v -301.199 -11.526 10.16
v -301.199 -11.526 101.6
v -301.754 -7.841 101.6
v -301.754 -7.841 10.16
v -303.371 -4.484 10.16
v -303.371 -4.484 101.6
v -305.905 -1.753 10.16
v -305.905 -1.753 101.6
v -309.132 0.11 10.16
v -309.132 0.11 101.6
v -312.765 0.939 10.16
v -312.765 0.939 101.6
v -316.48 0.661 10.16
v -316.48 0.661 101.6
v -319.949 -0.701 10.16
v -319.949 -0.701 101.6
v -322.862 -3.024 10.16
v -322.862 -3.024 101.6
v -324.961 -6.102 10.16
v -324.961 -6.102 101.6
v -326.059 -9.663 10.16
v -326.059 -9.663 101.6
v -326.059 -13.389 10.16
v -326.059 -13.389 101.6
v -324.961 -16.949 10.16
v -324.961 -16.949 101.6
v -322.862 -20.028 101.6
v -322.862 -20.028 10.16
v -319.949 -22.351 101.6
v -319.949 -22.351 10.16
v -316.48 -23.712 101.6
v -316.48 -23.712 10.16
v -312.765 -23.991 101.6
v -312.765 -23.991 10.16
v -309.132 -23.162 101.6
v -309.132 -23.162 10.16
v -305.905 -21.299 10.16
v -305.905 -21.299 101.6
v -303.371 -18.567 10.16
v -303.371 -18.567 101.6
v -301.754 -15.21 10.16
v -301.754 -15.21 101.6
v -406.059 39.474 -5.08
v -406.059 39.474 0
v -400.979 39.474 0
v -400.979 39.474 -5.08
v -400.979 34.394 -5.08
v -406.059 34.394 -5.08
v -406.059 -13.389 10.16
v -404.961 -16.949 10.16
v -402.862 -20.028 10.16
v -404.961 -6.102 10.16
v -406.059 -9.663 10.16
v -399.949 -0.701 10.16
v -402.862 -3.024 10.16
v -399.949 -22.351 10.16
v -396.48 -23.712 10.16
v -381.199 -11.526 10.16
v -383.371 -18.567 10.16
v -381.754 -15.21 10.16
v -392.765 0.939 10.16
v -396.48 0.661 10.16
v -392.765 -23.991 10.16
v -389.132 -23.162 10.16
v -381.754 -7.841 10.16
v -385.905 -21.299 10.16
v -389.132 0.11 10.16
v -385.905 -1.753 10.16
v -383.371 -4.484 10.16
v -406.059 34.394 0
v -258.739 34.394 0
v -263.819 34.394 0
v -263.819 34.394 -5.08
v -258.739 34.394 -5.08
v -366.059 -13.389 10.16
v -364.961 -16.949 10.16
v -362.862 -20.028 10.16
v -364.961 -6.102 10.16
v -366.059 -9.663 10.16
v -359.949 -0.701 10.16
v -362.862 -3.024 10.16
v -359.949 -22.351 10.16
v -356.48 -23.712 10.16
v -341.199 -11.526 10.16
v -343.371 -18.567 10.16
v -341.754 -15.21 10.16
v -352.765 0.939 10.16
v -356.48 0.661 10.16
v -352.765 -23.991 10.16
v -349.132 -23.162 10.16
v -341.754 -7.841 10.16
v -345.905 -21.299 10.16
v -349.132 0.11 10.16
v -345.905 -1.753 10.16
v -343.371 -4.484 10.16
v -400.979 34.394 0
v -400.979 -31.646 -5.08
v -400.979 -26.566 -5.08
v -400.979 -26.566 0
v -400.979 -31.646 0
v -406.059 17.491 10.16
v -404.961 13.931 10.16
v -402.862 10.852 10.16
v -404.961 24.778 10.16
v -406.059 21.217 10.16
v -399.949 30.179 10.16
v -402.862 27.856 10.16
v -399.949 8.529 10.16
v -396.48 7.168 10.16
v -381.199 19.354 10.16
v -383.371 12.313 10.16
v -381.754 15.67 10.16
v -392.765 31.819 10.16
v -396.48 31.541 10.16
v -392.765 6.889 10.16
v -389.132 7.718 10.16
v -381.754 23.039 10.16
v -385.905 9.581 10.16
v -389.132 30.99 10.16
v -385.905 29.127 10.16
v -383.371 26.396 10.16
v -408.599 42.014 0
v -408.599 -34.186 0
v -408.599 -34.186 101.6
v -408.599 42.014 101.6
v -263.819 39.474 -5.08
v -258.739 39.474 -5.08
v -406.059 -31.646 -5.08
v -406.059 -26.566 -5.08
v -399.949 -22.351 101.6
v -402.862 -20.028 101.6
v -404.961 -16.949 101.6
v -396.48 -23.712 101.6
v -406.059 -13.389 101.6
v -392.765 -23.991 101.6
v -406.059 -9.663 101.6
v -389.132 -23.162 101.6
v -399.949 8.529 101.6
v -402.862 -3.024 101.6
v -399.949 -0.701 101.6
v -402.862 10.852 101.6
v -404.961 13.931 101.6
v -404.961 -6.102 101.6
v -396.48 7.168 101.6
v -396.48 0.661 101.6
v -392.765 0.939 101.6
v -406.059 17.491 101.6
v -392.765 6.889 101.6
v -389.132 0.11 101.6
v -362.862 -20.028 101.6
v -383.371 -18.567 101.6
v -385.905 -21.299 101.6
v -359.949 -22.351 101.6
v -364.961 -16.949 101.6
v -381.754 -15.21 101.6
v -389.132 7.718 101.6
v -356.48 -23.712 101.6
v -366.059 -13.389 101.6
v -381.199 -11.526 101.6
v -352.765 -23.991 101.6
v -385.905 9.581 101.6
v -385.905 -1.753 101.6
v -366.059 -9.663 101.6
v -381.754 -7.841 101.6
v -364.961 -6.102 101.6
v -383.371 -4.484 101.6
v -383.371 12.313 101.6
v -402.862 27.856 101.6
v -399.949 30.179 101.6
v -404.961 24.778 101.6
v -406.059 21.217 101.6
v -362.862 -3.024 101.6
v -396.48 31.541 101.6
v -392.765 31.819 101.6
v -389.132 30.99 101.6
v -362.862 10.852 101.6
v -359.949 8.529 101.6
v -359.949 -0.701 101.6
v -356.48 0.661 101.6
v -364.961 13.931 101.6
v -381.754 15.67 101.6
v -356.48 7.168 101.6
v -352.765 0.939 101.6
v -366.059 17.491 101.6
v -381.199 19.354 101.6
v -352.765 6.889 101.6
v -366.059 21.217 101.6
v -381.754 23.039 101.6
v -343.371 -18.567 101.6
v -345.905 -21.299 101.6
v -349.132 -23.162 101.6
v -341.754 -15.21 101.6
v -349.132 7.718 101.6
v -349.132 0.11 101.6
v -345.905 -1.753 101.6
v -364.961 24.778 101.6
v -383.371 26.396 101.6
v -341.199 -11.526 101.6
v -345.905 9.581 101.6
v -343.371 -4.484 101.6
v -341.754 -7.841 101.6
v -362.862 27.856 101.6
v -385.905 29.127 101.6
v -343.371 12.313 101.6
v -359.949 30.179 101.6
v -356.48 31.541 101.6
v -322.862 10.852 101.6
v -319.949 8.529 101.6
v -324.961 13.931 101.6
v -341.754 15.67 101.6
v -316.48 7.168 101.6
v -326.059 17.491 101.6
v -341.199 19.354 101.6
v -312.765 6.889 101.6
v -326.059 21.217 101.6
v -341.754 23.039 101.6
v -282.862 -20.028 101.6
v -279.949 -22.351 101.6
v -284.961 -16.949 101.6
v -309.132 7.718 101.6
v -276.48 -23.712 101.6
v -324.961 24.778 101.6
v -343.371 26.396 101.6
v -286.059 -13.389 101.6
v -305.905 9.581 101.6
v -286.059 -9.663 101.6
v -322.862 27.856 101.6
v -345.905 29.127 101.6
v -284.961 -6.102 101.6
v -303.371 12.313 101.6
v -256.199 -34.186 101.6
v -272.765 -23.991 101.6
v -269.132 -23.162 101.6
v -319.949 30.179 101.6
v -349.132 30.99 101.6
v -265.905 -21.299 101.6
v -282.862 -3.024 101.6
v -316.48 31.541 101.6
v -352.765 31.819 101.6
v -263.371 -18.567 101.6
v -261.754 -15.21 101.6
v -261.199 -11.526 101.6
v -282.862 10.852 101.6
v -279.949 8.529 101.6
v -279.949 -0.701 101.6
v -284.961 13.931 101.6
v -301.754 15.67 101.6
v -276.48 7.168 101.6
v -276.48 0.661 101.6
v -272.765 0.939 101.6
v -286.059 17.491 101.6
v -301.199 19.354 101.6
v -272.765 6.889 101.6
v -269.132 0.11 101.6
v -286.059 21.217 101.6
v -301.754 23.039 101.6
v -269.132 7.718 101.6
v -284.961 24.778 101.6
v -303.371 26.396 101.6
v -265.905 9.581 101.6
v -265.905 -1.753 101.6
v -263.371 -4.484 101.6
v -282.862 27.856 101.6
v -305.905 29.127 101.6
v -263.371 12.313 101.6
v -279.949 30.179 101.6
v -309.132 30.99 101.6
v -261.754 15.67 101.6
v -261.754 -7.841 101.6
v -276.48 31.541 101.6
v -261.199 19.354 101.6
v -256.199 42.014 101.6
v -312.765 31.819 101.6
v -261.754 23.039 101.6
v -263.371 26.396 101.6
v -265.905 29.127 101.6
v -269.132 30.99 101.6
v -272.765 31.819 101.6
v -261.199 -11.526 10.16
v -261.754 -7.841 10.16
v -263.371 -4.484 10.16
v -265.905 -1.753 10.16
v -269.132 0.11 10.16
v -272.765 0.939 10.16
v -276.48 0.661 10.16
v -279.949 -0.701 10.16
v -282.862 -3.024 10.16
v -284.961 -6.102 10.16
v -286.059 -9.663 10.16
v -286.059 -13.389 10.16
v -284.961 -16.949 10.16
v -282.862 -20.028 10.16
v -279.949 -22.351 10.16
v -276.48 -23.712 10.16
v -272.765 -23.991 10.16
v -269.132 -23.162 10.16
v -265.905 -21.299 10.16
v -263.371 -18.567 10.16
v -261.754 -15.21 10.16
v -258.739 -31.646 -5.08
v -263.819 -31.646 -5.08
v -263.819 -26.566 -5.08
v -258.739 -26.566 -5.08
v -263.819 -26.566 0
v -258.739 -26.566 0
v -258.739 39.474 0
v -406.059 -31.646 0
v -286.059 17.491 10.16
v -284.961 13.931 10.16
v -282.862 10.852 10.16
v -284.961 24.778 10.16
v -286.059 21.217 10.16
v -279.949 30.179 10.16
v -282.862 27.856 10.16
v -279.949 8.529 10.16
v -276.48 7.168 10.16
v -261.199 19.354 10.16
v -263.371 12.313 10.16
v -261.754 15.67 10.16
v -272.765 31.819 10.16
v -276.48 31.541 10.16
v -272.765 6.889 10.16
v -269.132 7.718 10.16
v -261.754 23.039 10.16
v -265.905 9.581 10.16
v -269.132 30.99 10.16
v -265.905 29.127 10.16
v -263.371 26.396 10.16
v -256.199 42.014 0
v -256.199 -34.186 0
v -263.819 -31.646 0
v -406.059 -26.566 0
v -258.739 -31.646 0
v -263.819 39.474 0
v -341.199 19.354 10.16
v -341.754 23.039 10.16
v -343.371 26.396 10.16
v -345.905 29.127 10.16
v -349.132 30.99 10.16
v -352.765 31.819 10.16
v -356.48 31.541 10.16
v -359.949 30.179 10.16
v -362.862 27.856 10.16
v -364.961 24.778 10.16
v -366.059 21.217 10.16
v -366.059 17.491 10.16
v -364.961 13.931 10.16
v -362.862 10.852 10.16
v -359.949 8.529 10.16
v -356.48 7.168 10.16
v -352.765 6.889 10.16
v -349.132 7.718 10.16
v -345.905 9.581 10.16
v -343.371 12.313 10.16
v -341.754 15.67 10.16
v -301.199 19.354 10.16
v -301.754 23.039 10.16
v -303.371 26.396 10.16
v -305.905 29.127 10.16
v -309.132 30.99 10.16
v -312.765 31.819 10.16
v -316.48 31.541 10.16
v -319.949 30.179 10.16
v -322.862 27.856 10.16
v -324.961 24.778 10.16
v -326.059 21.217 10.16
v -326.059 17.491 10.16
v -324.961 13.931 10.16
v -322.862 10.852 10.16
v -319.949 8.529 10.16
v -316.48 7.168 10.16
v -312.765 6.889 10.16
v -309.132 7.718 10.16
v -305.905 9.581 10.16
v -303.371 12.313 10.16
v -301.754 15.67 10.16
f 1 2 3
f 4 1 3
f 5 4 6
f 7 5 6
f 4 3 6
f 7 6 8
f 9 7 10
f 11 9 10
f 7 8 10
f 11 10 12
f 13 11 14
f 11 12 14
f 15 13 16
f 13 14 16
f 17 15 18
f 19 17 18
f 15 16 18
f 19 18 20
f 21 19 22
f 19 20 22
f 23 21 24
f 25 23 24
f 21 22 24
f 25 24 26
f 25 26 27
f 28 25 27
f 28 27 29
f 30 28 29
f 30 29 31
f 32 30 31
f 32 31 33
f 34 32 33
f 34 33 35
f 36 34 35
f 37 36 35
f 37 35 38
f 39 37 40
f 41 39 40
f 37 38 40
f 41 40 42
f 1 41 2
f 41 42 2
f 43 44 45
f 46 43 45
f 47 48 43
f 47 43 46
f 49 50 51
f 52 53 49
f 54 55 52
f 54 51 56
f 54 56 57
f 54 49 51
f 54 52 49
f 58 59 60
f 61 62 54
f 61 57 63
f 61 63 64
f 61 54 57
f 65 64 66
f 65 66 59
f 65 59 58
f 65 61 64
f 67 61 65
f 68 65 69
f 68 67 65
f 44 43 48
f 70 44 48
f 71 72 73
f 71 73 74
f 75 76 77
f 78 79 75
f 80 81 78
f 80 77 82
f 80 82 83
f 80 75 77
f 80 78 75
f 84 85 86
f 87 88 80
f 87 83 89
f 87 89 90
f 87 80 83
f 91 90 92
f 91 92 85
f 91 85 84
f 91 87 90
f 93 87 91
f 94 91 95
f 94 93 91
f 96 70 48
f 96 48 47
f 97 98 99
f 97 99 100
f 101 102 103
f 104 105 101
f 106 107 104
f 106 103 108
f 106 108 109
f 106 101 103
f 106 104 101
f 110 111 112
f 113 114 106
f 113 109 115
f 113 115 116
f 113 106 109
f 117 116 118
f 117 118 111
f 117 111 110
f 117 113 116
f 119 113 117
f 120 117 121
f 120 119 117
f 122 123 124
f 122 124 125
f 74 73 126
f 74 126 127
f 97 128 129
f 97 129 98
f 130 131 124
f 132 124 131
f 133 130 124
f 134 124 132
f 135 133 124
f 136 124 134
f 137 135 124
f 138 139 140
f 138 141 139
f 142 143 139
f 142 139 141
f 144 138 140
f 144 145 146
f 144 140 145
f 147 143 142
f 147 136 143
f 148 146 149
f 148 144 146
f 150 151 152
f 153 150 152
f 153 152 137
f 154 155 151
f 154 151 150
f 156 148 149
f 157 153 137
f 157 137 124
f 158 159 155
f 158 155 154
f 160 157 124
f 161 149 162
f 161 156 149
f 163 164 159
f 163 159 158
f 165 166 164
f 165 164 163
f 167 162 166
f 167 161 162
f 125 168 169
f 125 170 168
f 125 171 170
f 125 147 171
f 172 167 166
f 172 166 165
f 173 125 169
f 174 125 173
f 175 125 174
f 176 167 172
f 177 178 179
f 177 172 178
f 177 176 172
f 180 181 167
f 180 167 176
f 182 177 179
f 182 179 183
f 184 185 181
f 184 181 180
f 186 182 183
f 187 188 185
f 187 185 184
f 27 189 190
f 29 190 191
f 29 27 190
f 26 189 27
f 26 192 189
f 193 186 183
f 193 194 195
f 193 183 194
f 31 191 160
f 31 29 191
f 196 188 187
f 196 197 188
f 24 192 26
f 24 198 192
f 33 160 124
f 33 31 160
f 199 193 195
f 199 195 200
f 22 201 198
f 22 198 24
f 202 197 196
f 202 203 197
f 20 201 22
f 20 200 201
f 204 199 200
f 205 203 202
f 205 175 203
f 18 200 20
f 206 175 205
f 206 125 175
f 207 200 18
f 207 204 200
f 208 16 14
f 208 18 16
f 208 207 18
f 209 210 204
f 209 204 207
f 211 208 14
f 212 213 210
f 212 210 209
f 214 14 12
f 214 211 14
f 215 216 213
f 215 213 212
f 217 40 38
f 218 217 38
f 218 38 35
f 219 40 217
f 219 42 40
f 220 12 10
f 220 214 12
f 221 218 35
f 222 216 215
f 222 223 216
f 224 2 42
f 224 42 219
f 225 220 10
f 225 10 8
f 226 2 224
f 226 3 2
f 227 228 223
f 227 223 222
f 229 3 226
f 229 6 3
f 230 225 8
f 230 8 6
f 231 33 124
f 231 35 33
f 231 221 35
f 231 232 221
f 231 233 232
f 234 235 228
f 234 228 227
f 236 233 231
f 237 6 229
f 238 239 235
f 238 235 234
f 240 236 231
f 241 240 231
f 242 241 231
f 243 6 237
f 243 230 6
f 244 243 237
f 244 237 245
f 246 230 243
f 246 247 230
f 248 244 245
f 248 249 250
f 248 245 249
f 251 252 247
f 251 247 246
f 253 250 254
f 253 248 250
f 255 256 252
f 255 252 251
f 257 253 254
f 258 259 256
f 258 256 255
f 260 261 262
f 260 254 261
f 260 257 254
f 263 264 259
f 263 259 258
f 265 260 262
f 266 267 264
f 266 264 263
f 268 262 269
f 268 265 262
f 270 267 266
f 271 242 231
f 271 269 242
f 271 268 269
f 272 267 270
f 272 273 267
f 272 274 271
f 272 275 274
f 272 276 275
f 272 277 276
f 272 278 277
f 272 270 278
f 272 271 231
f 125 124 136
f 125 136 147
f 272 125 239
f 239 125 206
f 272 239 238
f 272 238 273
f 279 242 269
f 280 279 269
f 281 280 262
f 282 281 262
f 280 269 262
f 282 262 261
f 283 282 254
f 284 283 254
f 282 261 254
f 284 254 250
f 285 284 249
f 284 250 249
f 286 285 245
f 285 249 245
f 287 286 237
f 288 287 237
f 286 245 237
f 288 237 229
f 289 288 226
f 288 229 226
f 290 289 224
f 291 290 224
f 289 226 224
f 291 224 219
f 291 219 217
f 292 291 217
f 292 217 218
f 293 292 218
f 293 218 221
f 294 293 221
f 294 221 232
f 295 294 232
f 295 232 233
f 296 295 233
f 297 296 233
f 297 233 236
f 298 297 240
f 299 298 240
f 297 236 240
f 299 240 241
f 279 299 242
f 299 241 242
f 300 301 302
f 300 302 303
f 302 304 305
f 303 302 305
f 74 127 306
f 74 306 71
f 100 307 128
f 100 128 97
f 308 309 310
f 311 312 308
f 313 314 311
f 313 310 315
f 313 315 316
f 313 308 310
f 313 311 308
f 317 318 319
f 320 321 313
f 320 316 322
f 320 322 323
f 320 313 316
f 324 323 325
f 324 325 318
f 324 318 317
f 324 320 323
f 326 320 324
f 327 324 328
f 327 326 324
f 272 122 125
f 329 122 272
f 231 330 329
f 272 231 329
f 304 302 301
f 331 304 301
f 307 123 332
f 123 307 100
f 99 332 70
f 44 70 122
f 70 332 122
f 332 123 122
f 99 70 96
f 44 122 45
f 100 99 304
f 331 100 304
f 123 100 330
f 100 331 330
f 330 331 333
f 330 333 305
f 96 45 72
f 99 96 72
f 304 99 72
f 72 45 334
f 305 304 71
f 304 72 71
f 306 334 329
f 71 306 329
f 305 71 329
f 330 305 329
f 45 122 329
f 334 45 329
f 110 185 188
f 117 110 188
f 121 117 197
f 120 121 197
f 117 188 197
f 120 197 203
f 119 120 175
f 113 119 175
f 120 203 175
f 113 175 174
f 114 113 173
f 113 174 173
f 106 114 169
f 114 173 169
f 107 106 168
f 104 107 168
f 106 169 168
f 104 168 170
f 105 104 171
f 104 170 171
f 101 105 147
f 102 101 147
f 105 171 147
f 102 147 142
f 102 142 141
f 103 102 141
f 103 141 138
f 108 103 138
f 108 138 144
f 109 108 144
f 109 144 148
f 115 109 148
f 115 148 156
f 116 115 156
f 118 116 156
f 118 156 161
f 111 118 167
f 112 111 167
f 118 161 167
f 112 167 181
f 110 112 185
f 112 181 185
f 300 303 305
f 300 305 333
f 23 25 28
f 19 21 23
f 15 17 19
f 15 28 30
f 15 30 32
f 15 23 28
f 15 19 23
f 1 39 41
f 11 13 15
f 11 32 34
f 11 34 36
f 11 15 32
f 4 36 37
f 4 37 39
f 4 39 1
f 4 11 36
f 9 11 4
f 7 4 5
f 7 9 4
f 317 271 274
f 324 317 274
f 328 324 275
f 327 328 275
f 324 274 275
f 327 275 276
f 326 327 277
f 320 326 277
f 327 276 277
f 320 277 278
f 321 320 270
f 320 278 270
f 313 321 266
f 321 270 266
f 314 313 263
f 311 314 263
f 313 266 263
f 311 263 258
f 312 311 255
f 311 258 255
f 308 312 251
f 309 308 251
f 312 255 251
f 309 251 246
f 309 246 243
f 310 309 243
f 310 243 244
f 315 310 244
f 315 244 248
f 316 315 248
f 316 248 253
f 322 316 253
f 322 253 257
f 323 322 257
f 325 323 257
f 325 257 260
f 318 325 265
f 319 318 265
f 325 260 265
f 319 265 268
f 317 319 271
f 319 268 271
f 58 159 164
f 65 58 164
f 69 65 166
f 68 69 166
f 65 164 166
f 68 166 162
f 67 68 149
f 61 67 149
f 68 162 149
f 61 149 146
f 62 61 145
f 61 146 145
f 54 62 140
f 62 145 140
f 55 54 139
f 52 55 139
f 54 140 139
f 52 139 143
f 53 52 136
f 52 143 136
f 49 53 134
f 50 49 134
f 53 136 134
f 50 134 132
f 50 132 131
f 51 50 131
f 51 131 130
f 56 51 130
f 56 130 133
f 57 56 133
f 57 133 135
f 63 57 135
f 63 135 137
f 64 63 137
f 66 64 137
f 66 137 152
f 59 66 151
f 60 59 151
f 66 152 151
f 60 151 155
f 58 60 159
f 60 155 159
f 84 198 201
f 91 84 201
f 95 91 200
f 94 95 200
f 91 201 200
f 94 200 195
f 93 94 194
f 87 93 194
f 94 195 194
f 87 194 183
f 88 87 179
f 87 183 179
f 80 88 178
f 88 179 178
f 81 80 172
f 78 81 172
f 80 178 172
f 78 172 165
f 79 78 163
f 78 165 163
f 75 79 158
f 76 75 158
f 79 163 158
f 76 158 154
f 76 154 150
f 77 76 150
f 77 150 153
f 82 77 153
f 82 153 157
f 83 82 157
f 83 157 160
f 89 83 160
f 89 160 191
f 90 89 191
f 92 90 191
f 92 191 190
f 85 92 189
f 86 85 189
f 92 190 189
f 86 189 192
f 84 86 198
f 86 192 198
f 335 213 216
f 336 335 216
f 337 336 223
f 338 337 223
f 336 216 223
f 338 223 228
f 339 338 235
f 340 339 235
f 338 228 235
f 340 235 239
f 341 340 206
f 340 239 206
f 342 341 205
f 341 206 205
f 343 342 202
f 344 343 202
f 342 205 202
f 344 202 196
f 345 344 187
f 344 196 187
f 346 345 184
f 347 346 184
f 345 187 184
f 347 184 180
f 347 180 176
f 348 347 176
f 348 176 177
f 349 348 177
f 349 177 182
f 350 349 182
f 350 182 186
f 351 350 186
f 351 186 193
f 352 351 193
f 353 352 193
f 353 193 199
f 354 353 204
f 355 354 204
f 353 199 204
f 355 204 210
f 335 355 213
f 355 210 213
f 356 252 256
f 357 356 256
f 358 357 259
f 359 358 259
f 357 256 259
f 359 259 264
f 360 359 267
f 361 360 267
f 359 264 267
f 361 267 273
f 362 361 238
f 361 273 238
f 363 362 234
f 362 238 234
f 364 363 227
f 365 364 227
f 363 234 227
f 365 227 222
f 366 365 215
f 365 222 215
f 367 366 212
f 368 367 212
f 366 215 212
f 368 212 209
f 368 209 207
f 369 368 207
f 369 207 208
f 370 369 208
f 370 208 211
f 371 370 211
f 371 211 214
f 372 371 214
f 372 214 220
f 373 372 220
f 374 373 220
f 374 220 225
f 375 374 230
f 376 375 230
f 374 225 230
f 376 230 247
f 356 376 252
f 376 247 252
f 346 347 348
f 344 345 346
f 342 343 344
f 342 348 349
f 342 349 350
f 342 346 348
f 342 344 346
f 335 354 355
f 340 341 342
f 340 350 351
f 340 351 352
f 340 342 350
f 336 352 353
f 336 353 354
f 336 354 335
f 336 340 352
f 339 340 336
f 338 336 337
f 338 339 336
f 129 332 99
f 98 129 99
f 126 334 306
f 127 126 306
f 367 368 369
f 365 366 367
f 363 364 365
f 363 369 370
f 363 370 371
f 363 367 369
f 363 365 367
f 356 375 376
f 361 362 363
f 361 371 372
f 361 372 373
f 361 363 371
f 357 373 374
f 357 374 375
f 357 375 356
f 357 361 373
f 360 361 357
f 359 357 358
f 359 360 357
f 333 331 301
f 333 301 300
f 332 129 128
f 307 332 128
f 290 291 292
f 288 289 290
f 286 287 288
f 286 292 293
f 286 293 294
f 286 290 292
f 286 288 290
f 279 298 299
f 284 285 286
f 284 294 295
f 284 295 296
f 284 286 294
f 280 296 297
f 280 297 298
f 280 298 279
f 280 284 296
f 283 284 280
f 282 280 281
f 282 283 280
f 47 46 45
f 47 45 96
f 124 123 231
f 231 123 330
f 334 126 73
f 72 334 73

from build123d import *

# Parameters (mm, degrees)
F0_W     = 152.4
F0_H     = 76.2
F1_DEPTH = 101.6
F2_R     = 12.5
F3_DEPTH = 91.44
F4_W     = 5.08
F4_H     = 5.08
F5_DEPTH = 5.08


with BuildPart() as f1:
    # F0 (on Top) → F1 (new body)
    with BuildSketch(Plane.XY):
        with Locations((-332.398888, 3.914099)):
            Rectangle(F0_W, F0_H)
    extrude(amount=F1_DEPTH)

    # F2 (on face) → F3 (cut)
    with BuildSketch(Plane.XY.offset(101.6)):
        with Locations((-393.698888, 19.354099)):
            Circle(F2_R)
        with Locations((-353.698888, 19.354099)):
            Circle(F2_R)
        with Locations((-313.698888, 19.354099)):
            Circle(F2_R)
        with Locations((-273.698888, -11.525901)):
            Circle(F2_R)
        with Locations((-313.698888, -11.525901)):
            Circle(F2_R)
        with Locations((-353.698888, -11.525901)):
            Circle(F2_R)
        with Locations((-393.698888, -11.525901)):
            Circle(F2_R)
        with Locations((-273.698888, 19.354099)):
            Circle(F2_R)
    extrude(amount=-F3_DEPTH, mode=Mode.SUBTRACT)

    # F4 (on face) → F5 (join)
    with BuildSketch(Plane(origin=(0, 0, 0), x_dir=(1, 0, 0), z_dir=(0, 0, -1))):
        with Locations((-403.518888, 29.105901)):
            Rectangle(F4_W, F4_H)
        with Locations((-403.518888, -36.934099)):
            Rectangle(F4_W, F4_H)
        with Locations((-261.278888, -36.934099)):
            Rectangle(F4_W, F4_H)
        with Locations((-261.278888, 29.105901)):
            Rectangle(F4_W, F4_H)
    extrude(amount=F5_DEPTH)


solid = f1.part
